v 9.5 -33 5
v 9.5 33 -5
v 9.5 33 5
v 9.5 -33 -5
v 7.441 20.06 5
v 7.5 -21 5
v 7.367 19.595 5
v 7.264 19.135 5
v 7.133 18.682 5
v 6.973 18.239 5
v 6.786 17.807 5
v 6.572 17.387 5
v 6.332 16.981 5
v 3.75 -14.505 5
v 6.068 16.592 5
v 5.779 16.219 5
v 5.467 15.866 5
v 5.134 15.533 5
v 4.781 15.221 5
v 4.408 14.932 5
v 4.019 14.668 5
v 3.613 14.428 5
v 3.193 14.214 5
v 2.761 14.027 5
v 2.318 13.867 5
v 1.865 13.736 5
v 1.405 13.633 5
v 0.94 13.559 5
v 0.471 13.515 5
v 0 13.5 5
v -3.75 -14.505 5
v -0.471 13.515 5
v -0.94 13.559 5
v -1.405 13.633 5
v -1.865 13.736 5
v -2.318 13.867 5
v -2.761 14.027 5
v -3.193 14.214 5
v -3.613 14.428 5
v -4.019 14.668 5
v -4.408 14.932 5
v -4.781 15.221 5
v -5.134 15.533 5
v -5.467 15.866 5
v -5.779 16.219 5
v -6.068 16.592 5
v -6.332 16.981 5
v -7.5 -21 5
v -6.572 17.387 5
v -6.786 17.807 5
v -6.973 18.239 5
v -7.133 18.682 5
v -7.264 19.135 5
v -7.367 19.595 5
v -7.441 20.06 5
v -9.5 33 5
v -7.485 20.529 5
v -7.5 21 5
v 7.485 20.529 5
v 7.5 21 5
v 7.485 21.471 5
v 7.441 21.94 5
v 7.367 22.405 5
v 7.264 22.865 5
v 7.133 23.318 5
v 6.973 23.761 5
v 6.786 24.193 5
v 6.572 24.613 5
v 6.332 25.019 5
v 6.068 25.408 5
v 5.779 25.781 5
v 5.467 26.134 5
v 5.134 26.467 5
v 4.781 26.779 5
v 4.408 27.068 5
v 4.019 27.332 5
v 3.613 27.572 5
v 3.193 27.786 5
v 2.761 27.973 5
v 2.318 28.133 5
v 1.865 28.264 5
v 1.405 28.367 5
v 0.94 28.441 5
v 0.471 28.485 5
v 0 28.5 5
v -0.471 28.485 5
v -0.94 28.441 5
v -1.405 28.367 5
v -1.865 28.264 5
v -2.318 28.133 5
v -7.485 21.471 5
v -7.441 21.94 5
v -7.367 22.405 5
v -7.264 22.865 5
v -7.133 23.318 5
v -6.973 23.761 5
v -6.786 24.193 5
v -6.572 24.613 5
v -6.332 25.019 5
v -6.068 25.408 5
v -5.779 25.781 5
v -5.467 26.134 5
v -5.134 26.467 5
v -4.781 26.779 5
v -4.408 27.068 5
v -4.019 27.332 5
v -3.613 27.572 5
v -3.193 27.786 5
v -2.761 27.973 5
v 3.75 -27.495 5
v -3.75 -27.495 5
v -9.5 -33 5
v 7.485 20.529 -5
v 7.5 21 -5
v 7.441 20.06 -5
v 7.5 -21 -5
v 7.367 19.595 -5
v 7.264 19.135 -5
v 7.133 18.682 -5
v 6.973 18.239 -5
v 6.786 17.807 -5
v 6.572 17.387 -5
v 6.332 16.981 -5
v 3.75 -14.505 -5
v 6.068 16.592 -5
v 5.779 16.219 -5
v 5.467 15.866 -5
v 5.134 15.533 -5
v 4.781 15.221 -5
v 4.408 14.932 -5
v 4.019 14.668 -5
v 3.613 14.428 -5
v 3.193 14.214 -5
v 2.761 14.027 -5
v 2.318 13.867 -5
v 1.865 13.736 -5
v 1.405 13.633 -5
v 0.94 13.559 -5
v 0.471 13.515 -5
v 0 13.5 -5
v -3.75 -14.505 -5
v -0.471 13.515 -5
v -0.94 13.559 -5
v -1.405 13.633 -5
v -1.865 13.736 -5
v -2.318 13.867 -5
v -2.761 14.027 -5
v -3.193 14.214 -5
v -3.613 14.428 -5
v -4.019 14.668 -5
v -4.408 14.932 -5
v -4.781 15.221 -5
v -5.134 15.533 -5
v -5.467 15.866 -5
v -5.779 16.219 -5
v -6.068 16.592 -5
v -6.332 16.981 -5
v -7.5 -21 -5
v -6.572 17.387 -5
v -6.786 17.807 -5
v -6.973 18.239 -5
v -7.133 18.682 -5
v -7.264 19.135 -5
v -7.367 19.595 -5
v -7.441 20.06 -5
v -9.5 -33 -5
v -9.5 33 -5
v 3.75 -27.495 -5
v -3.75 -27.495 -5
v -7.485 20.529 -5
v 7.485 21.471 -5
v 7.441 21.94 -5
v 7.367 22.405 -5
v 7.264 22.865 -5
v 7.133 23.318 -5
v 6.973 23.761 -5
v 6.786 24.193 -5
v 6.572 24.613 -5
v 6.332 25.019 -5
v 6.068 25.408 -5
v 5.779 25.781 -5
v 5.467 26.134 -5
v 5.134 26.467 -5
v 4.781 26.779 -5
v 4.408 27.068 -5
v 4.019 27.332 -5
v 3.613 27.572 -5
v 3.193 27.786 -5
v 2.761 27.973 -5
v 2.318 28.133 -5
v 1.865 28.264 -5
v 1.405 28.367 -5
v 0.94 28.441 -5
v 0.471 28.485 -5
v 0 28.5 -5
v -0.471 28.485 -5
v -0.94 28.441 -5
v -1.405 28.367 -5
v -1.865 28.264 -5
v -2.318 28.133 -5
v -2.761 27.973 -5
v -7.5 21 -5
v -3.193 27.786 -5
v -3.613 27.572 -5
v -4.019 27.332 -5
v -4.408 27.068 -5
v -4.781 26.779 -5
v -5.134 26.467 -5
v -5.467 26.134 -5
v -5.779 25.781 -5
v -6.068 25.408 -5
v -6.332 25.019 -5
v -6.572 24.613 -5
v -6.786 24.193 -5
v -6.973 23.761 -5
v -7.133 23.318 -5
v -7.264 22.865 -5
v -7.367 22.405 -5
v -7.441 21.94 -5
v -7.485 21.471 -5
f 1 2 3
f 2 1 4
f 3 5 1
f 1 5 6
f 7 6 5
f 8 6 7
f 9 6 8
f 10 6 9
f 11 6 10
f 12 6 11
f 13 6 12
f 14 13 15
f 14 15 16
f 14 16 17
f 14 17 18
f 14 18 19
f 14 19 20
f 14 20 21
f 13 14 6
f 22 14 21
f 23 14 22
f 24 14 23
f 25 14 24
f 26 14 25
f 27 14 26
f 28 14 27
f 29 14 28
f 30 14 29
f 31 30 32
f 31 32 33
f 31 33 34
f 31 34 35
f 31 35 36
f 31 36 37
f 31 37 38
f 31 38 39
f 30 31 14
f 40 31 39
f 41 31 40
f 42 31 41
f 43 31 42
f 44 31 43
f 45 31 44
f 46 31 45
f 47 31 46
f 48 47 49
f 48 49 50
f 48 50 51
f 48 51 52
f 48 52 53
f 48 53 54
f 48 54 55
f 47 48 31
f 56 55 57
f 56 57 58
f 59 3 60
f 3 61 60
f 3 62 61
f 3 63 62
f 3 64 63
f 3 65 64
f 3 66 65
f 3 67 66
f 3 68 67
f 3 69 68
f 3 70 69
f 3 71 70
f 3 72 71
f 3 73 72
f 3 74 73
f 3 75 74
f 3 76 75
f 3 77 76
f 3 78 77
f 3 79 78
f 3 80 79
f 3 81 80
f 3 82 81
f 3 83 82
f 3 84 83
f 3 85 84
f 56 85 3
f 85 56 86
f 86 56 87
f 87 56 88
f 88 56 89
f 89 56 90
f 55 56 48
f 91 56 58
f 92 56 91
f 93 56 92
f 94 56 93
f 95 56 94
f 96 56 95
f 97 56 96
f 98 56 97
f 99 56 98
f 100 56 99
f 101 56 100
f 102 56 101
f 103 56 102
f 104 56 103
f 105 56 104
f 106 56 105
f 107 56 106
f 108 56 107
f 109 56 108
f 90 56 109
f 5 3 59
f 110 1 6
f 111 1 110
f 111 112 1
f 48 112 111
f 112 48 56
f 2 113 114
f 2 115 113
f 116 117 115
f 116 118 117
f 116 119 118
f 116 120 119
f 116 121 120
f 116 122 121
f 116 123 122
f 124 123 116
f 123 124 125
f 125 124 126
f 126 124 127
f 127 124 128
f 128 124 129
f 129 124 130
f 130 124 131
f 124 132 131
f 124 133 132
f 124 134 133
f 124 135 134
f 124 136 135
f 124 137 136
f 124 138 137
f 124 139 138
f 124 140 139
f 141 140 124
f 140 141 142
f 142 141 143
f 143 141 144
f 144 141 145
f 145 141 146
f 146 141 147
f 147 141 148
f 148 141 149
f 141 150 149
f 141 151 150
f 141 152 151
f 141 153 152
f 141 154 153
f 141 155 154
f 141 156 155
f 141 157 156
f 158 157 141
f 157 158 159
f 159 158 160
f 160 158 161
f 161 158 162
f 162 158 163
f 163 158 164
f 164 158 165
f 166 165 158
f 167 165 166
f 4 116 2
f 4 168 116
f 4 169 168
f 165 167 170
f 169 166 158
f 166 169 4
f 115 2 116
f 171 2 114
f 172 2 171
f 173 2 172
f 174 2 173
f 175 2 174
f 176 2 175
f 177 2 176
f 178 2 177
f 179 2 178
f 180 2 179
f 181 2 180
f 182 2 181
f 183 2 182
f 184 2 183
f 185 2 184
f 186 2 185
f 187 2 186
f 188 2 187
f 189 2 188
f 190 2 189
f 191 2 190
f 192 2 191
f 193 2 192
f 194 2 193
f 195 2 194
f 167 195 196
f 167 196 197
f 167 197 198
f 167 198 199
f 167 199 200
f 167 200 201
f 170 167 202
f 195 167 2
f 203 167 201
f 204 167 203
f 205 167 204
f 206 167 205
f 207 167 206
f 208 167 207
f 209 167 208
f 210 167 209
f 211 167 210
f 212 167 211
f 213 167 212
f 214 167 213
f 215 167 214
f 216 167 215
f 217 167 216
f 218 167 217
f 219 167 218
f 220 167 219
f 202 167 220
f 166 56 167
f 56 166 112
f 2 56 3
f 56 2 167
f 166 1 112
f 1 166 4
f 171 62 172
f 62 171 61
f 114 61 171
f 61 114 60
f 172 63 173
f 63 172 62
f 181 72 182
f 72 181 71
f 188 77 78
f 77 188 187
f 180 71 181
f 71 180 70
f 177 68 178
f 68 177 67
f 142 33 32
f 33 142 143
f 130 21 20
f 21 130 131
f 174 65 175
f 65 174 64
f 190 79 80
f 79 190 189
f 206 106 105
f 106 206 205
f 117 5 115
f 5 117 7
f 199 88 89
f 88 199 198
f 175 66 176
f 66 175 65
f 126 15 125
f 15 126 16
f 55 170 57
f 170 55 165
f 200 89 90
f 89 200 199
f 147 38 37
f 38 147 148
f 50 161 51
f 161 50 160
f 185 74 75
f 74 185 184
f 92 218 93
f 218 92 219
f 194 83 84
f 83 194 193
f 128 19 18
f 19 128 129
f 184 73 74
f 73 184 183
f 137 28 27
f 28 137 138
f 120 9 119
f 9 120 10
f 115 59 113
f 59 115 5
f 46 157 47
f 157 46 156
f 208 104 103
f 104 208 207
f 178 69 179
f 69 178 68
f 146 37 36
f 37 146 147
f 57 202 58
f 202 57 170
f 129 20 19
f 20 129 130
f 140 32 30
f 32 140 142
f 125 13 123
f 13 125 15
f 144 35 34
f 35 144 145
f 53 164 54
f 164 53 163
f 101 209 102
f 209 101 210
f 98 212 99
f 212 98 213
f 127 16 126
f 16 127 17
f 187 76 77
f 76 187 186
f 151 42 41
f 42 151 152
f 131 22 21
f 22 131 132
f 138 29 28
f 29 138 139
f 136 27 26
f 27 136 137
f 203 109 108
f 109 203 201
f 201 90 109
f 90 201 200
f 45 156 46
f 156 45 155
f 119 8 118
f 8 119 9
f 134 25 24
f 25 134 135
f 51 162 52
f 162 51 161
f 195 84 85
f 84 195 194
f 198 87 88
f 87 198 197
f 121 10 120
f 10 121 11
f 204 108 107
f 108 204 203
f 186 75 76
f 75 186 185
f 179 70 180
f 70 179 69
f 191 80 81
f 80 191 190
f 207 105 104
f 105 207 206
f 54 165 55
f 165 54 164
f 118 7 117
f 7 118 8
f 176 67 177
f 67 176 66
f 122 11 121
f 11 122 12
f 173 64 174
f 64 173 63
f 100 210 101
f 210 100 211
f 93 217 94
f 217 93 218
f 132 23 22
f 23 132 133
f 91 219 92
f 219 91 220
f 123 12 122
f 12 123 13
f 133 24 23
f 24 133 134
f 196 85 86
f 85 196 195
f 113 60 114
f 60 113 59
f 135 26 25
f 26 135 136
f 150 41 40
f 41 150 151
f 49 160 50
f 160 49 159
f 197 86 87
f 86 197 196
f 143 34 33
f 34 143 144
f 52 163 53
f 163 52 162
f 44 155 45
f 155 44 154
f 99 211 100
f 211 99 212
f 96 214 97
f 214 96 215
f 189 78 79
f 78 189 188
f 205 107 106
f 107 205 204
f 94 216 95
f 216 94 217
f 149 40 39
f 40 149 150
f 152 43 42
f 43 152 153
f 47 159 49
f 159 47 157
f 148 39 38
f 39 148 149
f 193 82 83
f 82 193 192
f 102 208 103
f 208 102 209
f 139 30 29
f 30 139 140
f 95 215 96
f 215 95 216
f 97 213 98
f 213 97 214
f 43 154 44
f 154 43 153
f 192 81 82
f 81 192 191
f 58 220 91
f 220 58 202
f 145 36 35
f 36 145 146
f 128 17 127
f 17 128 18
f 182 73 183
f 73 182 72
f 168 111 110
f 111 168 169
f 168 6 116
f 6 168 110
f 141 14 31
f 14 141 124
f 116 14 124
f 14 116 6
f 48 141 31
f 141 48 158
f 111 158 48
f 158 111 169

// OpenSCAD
module axes_support() {
   difference() {
	// basic structure
	color("yellow") cube([19, 66, 10], center=true);
	color("red") translate([0, 21, 0]) cylinder(h = 10, r=7.5, $fn=100, center=true);
	color("blue") translate([0, -21, 0]) cylinder(h = 10, r=7.5, $fn=6, center=true);
   }
}

axes_support();
